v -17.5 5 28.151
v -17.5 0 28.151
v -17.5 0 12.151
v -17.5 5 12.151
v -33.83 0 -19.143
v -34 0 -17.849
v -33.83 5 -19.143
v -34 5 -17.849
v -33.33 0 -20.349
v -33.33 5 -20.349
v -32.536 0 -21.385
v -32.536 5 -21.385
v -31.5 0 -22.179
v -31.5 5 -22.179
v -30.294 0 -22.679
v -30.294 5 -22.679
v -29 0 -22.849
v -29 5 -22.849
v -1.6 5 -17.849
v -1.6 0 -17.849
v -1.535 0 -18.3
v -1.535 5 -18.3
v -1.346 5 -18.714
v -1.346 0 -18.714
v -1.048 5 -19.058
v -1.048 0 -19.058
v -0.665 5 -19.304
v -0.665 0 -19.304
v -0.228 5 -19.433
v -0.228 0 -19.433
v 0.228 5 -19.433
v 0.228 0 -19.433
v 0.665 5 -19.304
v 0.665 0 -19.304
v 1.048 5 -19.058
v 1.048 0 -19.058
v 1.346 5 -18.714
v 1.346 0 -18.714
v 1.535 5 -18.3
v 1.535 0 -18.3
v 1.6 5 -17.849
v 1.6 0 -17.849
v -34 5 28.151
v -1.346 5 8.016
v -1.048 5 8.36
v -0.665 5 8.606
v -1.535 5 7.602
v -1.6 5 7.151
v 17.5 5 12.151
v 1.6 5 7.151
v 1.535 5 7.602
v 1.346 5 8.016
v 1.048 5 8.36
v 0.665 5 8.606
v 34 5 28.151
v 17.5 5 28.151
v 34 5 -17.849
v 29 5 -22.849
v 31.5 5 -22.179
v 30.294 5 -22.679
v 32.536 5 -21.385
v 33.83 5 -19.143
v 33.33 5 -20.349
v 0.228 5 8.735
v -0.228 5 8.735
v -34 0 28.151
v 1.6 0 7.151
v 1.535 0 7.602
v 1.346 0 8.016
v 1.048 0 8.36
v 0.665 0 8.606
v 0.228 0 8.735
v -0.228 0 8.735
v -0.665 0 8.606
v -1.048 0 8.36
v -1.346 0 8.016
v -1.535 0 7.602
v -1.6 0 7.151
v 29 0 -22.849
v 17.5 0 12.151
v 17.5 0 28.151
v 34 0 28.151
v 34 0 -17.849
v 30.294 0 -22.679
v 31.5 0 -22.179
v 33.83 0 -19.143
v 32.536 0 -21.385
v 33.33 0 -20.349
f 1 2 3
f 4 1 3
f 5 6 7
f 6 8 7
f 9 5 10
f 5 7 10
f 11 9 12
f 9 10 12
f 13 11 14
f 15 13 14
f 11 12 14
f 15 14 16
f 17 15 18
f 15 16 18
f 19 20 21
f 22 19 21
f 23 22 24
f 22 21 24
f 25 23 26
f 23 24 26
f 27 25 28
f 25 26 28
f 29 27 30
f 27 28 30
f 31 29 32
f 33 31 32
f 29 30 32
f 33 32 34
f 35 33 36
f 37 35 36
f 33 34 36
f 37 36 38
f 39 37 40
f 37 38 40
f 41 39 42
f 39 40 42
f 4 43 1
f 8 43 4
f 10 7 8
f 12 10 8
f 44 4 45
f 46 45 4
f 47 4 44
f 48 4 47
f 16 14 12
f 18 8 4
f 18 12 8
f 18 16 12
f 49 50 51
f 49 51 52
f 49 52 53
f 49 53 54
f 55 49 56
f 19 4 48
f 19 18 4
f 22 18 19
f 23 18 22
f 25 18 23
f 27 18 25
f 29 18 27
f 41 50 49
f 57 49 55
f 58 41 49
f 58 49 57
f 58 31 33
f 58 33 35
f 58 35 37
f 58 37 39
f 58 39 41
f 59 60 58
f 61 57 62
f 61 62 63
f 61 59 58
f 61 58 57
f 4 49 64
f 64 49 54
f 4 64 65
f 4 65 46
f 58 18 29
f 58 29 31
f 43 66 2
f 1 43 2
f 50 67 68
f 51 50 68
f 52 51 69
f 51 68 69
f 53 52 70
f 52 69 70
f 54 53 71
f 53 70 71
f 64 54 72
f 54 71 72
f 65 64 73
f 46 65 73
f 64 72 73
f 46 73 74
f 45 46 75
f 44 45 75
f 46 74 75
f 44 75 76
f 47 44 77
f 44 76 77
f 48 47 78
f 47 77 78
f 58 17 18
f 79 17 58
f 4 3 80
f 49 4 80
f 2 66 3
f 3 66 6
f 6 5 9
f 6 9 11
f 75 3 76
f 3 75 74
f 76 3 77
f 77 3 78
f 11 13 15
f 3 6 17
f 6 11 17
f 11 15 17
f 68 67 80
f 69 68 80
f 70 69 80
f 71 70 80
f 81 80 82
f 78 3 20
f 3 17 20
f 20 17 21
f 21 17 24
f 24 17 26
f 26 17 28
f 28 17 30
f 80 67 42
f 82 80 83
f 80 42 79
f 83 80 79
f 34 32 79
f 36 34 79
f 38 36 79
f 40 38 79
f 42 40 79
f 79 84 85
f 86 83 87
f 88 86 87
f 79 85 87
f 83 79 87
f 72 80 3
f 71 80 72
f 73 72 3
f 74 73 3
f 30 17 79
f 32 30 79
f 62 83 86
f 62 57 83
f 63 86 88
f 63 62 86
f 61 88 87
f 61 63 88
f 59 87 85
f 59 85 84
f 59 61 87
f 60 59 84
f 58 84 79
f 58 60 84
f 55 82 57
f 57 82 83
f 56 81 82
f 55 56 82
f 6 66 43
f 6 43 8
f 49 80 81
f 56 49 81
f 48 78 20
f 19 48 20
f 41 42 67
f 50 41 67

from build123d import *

# Parameters (mm, degrees)
EXTRUDE_1_DEPTH = 5
SKETCH_2_W      = 4
SKETCH_2_H      = 28
EXTRUDE_2_DEPTH = 5
FILLET_1_R      = 5


with BuildPart() as part:
    # 草图1 → 凸台-拉伸1 (new body)
    with BuildSketch(Plane(origin=(0, 0, 0), x_dir=(1, 0, 0), z_dir=(0, 1, 0))):
        Polygon((30, 22.84905584), (-30, 22.84905584), (-30, -5.15094416), (-34, -5.15094416), (-34, -28.15094416), (-17.5, -28.15094416), (-17.5, -12.15094416), (17.5, -12.15094416), (17.5, -28.15094416), (34, -28.15094416), (34, -5.15094416), (30, -5.15094416), align=None)
        with BuildLine():
            Line((1.6, 17.84905584), (1.6, -7.15094416))
            ThreePointArc((1.6, -7.15094416), (0, -8.75094416), (-1.6, -7.15094416))
            Line((-1.6, -7.15094416), (-1.6, 17.84905584))
            ThreePointArc((-1.6, 17.84905584), (0, 19.44905584), (1.6, 17.84905584))
        make_face(mode=Mode.SUBTRACT)
    extrude(amount=EXTRUDE_1_DEPTH)

    # 草图2 → 凸台-拉伸2 (add)
    with BuildSketch(Plane(origin=(0, 0, 0), x_dir=(1, 0, 0), z_dir=(0, 1, 0))):
        with Locations((-32, 8.84905584)):
            Rectangle(SKETCH_2_W, SKETCH_2_H)
        with Locations((32, 8.84905584)):
            Rectangle(SKETCH_2_W, SKETCH_2_H)
    extrude(amount=EXTRUDE_2_DEPTH)

    # 圆角1
    fillet_1_edges = [part.edges().sort_by_distance(p)[0] for p in [
        (-34, 2.5, -22.84905584),
        (34, 2.5, -22.84905584),
    ]]
    fillet(fillet_1_edges, radius=FILLET_1_R)


solid = part.part
